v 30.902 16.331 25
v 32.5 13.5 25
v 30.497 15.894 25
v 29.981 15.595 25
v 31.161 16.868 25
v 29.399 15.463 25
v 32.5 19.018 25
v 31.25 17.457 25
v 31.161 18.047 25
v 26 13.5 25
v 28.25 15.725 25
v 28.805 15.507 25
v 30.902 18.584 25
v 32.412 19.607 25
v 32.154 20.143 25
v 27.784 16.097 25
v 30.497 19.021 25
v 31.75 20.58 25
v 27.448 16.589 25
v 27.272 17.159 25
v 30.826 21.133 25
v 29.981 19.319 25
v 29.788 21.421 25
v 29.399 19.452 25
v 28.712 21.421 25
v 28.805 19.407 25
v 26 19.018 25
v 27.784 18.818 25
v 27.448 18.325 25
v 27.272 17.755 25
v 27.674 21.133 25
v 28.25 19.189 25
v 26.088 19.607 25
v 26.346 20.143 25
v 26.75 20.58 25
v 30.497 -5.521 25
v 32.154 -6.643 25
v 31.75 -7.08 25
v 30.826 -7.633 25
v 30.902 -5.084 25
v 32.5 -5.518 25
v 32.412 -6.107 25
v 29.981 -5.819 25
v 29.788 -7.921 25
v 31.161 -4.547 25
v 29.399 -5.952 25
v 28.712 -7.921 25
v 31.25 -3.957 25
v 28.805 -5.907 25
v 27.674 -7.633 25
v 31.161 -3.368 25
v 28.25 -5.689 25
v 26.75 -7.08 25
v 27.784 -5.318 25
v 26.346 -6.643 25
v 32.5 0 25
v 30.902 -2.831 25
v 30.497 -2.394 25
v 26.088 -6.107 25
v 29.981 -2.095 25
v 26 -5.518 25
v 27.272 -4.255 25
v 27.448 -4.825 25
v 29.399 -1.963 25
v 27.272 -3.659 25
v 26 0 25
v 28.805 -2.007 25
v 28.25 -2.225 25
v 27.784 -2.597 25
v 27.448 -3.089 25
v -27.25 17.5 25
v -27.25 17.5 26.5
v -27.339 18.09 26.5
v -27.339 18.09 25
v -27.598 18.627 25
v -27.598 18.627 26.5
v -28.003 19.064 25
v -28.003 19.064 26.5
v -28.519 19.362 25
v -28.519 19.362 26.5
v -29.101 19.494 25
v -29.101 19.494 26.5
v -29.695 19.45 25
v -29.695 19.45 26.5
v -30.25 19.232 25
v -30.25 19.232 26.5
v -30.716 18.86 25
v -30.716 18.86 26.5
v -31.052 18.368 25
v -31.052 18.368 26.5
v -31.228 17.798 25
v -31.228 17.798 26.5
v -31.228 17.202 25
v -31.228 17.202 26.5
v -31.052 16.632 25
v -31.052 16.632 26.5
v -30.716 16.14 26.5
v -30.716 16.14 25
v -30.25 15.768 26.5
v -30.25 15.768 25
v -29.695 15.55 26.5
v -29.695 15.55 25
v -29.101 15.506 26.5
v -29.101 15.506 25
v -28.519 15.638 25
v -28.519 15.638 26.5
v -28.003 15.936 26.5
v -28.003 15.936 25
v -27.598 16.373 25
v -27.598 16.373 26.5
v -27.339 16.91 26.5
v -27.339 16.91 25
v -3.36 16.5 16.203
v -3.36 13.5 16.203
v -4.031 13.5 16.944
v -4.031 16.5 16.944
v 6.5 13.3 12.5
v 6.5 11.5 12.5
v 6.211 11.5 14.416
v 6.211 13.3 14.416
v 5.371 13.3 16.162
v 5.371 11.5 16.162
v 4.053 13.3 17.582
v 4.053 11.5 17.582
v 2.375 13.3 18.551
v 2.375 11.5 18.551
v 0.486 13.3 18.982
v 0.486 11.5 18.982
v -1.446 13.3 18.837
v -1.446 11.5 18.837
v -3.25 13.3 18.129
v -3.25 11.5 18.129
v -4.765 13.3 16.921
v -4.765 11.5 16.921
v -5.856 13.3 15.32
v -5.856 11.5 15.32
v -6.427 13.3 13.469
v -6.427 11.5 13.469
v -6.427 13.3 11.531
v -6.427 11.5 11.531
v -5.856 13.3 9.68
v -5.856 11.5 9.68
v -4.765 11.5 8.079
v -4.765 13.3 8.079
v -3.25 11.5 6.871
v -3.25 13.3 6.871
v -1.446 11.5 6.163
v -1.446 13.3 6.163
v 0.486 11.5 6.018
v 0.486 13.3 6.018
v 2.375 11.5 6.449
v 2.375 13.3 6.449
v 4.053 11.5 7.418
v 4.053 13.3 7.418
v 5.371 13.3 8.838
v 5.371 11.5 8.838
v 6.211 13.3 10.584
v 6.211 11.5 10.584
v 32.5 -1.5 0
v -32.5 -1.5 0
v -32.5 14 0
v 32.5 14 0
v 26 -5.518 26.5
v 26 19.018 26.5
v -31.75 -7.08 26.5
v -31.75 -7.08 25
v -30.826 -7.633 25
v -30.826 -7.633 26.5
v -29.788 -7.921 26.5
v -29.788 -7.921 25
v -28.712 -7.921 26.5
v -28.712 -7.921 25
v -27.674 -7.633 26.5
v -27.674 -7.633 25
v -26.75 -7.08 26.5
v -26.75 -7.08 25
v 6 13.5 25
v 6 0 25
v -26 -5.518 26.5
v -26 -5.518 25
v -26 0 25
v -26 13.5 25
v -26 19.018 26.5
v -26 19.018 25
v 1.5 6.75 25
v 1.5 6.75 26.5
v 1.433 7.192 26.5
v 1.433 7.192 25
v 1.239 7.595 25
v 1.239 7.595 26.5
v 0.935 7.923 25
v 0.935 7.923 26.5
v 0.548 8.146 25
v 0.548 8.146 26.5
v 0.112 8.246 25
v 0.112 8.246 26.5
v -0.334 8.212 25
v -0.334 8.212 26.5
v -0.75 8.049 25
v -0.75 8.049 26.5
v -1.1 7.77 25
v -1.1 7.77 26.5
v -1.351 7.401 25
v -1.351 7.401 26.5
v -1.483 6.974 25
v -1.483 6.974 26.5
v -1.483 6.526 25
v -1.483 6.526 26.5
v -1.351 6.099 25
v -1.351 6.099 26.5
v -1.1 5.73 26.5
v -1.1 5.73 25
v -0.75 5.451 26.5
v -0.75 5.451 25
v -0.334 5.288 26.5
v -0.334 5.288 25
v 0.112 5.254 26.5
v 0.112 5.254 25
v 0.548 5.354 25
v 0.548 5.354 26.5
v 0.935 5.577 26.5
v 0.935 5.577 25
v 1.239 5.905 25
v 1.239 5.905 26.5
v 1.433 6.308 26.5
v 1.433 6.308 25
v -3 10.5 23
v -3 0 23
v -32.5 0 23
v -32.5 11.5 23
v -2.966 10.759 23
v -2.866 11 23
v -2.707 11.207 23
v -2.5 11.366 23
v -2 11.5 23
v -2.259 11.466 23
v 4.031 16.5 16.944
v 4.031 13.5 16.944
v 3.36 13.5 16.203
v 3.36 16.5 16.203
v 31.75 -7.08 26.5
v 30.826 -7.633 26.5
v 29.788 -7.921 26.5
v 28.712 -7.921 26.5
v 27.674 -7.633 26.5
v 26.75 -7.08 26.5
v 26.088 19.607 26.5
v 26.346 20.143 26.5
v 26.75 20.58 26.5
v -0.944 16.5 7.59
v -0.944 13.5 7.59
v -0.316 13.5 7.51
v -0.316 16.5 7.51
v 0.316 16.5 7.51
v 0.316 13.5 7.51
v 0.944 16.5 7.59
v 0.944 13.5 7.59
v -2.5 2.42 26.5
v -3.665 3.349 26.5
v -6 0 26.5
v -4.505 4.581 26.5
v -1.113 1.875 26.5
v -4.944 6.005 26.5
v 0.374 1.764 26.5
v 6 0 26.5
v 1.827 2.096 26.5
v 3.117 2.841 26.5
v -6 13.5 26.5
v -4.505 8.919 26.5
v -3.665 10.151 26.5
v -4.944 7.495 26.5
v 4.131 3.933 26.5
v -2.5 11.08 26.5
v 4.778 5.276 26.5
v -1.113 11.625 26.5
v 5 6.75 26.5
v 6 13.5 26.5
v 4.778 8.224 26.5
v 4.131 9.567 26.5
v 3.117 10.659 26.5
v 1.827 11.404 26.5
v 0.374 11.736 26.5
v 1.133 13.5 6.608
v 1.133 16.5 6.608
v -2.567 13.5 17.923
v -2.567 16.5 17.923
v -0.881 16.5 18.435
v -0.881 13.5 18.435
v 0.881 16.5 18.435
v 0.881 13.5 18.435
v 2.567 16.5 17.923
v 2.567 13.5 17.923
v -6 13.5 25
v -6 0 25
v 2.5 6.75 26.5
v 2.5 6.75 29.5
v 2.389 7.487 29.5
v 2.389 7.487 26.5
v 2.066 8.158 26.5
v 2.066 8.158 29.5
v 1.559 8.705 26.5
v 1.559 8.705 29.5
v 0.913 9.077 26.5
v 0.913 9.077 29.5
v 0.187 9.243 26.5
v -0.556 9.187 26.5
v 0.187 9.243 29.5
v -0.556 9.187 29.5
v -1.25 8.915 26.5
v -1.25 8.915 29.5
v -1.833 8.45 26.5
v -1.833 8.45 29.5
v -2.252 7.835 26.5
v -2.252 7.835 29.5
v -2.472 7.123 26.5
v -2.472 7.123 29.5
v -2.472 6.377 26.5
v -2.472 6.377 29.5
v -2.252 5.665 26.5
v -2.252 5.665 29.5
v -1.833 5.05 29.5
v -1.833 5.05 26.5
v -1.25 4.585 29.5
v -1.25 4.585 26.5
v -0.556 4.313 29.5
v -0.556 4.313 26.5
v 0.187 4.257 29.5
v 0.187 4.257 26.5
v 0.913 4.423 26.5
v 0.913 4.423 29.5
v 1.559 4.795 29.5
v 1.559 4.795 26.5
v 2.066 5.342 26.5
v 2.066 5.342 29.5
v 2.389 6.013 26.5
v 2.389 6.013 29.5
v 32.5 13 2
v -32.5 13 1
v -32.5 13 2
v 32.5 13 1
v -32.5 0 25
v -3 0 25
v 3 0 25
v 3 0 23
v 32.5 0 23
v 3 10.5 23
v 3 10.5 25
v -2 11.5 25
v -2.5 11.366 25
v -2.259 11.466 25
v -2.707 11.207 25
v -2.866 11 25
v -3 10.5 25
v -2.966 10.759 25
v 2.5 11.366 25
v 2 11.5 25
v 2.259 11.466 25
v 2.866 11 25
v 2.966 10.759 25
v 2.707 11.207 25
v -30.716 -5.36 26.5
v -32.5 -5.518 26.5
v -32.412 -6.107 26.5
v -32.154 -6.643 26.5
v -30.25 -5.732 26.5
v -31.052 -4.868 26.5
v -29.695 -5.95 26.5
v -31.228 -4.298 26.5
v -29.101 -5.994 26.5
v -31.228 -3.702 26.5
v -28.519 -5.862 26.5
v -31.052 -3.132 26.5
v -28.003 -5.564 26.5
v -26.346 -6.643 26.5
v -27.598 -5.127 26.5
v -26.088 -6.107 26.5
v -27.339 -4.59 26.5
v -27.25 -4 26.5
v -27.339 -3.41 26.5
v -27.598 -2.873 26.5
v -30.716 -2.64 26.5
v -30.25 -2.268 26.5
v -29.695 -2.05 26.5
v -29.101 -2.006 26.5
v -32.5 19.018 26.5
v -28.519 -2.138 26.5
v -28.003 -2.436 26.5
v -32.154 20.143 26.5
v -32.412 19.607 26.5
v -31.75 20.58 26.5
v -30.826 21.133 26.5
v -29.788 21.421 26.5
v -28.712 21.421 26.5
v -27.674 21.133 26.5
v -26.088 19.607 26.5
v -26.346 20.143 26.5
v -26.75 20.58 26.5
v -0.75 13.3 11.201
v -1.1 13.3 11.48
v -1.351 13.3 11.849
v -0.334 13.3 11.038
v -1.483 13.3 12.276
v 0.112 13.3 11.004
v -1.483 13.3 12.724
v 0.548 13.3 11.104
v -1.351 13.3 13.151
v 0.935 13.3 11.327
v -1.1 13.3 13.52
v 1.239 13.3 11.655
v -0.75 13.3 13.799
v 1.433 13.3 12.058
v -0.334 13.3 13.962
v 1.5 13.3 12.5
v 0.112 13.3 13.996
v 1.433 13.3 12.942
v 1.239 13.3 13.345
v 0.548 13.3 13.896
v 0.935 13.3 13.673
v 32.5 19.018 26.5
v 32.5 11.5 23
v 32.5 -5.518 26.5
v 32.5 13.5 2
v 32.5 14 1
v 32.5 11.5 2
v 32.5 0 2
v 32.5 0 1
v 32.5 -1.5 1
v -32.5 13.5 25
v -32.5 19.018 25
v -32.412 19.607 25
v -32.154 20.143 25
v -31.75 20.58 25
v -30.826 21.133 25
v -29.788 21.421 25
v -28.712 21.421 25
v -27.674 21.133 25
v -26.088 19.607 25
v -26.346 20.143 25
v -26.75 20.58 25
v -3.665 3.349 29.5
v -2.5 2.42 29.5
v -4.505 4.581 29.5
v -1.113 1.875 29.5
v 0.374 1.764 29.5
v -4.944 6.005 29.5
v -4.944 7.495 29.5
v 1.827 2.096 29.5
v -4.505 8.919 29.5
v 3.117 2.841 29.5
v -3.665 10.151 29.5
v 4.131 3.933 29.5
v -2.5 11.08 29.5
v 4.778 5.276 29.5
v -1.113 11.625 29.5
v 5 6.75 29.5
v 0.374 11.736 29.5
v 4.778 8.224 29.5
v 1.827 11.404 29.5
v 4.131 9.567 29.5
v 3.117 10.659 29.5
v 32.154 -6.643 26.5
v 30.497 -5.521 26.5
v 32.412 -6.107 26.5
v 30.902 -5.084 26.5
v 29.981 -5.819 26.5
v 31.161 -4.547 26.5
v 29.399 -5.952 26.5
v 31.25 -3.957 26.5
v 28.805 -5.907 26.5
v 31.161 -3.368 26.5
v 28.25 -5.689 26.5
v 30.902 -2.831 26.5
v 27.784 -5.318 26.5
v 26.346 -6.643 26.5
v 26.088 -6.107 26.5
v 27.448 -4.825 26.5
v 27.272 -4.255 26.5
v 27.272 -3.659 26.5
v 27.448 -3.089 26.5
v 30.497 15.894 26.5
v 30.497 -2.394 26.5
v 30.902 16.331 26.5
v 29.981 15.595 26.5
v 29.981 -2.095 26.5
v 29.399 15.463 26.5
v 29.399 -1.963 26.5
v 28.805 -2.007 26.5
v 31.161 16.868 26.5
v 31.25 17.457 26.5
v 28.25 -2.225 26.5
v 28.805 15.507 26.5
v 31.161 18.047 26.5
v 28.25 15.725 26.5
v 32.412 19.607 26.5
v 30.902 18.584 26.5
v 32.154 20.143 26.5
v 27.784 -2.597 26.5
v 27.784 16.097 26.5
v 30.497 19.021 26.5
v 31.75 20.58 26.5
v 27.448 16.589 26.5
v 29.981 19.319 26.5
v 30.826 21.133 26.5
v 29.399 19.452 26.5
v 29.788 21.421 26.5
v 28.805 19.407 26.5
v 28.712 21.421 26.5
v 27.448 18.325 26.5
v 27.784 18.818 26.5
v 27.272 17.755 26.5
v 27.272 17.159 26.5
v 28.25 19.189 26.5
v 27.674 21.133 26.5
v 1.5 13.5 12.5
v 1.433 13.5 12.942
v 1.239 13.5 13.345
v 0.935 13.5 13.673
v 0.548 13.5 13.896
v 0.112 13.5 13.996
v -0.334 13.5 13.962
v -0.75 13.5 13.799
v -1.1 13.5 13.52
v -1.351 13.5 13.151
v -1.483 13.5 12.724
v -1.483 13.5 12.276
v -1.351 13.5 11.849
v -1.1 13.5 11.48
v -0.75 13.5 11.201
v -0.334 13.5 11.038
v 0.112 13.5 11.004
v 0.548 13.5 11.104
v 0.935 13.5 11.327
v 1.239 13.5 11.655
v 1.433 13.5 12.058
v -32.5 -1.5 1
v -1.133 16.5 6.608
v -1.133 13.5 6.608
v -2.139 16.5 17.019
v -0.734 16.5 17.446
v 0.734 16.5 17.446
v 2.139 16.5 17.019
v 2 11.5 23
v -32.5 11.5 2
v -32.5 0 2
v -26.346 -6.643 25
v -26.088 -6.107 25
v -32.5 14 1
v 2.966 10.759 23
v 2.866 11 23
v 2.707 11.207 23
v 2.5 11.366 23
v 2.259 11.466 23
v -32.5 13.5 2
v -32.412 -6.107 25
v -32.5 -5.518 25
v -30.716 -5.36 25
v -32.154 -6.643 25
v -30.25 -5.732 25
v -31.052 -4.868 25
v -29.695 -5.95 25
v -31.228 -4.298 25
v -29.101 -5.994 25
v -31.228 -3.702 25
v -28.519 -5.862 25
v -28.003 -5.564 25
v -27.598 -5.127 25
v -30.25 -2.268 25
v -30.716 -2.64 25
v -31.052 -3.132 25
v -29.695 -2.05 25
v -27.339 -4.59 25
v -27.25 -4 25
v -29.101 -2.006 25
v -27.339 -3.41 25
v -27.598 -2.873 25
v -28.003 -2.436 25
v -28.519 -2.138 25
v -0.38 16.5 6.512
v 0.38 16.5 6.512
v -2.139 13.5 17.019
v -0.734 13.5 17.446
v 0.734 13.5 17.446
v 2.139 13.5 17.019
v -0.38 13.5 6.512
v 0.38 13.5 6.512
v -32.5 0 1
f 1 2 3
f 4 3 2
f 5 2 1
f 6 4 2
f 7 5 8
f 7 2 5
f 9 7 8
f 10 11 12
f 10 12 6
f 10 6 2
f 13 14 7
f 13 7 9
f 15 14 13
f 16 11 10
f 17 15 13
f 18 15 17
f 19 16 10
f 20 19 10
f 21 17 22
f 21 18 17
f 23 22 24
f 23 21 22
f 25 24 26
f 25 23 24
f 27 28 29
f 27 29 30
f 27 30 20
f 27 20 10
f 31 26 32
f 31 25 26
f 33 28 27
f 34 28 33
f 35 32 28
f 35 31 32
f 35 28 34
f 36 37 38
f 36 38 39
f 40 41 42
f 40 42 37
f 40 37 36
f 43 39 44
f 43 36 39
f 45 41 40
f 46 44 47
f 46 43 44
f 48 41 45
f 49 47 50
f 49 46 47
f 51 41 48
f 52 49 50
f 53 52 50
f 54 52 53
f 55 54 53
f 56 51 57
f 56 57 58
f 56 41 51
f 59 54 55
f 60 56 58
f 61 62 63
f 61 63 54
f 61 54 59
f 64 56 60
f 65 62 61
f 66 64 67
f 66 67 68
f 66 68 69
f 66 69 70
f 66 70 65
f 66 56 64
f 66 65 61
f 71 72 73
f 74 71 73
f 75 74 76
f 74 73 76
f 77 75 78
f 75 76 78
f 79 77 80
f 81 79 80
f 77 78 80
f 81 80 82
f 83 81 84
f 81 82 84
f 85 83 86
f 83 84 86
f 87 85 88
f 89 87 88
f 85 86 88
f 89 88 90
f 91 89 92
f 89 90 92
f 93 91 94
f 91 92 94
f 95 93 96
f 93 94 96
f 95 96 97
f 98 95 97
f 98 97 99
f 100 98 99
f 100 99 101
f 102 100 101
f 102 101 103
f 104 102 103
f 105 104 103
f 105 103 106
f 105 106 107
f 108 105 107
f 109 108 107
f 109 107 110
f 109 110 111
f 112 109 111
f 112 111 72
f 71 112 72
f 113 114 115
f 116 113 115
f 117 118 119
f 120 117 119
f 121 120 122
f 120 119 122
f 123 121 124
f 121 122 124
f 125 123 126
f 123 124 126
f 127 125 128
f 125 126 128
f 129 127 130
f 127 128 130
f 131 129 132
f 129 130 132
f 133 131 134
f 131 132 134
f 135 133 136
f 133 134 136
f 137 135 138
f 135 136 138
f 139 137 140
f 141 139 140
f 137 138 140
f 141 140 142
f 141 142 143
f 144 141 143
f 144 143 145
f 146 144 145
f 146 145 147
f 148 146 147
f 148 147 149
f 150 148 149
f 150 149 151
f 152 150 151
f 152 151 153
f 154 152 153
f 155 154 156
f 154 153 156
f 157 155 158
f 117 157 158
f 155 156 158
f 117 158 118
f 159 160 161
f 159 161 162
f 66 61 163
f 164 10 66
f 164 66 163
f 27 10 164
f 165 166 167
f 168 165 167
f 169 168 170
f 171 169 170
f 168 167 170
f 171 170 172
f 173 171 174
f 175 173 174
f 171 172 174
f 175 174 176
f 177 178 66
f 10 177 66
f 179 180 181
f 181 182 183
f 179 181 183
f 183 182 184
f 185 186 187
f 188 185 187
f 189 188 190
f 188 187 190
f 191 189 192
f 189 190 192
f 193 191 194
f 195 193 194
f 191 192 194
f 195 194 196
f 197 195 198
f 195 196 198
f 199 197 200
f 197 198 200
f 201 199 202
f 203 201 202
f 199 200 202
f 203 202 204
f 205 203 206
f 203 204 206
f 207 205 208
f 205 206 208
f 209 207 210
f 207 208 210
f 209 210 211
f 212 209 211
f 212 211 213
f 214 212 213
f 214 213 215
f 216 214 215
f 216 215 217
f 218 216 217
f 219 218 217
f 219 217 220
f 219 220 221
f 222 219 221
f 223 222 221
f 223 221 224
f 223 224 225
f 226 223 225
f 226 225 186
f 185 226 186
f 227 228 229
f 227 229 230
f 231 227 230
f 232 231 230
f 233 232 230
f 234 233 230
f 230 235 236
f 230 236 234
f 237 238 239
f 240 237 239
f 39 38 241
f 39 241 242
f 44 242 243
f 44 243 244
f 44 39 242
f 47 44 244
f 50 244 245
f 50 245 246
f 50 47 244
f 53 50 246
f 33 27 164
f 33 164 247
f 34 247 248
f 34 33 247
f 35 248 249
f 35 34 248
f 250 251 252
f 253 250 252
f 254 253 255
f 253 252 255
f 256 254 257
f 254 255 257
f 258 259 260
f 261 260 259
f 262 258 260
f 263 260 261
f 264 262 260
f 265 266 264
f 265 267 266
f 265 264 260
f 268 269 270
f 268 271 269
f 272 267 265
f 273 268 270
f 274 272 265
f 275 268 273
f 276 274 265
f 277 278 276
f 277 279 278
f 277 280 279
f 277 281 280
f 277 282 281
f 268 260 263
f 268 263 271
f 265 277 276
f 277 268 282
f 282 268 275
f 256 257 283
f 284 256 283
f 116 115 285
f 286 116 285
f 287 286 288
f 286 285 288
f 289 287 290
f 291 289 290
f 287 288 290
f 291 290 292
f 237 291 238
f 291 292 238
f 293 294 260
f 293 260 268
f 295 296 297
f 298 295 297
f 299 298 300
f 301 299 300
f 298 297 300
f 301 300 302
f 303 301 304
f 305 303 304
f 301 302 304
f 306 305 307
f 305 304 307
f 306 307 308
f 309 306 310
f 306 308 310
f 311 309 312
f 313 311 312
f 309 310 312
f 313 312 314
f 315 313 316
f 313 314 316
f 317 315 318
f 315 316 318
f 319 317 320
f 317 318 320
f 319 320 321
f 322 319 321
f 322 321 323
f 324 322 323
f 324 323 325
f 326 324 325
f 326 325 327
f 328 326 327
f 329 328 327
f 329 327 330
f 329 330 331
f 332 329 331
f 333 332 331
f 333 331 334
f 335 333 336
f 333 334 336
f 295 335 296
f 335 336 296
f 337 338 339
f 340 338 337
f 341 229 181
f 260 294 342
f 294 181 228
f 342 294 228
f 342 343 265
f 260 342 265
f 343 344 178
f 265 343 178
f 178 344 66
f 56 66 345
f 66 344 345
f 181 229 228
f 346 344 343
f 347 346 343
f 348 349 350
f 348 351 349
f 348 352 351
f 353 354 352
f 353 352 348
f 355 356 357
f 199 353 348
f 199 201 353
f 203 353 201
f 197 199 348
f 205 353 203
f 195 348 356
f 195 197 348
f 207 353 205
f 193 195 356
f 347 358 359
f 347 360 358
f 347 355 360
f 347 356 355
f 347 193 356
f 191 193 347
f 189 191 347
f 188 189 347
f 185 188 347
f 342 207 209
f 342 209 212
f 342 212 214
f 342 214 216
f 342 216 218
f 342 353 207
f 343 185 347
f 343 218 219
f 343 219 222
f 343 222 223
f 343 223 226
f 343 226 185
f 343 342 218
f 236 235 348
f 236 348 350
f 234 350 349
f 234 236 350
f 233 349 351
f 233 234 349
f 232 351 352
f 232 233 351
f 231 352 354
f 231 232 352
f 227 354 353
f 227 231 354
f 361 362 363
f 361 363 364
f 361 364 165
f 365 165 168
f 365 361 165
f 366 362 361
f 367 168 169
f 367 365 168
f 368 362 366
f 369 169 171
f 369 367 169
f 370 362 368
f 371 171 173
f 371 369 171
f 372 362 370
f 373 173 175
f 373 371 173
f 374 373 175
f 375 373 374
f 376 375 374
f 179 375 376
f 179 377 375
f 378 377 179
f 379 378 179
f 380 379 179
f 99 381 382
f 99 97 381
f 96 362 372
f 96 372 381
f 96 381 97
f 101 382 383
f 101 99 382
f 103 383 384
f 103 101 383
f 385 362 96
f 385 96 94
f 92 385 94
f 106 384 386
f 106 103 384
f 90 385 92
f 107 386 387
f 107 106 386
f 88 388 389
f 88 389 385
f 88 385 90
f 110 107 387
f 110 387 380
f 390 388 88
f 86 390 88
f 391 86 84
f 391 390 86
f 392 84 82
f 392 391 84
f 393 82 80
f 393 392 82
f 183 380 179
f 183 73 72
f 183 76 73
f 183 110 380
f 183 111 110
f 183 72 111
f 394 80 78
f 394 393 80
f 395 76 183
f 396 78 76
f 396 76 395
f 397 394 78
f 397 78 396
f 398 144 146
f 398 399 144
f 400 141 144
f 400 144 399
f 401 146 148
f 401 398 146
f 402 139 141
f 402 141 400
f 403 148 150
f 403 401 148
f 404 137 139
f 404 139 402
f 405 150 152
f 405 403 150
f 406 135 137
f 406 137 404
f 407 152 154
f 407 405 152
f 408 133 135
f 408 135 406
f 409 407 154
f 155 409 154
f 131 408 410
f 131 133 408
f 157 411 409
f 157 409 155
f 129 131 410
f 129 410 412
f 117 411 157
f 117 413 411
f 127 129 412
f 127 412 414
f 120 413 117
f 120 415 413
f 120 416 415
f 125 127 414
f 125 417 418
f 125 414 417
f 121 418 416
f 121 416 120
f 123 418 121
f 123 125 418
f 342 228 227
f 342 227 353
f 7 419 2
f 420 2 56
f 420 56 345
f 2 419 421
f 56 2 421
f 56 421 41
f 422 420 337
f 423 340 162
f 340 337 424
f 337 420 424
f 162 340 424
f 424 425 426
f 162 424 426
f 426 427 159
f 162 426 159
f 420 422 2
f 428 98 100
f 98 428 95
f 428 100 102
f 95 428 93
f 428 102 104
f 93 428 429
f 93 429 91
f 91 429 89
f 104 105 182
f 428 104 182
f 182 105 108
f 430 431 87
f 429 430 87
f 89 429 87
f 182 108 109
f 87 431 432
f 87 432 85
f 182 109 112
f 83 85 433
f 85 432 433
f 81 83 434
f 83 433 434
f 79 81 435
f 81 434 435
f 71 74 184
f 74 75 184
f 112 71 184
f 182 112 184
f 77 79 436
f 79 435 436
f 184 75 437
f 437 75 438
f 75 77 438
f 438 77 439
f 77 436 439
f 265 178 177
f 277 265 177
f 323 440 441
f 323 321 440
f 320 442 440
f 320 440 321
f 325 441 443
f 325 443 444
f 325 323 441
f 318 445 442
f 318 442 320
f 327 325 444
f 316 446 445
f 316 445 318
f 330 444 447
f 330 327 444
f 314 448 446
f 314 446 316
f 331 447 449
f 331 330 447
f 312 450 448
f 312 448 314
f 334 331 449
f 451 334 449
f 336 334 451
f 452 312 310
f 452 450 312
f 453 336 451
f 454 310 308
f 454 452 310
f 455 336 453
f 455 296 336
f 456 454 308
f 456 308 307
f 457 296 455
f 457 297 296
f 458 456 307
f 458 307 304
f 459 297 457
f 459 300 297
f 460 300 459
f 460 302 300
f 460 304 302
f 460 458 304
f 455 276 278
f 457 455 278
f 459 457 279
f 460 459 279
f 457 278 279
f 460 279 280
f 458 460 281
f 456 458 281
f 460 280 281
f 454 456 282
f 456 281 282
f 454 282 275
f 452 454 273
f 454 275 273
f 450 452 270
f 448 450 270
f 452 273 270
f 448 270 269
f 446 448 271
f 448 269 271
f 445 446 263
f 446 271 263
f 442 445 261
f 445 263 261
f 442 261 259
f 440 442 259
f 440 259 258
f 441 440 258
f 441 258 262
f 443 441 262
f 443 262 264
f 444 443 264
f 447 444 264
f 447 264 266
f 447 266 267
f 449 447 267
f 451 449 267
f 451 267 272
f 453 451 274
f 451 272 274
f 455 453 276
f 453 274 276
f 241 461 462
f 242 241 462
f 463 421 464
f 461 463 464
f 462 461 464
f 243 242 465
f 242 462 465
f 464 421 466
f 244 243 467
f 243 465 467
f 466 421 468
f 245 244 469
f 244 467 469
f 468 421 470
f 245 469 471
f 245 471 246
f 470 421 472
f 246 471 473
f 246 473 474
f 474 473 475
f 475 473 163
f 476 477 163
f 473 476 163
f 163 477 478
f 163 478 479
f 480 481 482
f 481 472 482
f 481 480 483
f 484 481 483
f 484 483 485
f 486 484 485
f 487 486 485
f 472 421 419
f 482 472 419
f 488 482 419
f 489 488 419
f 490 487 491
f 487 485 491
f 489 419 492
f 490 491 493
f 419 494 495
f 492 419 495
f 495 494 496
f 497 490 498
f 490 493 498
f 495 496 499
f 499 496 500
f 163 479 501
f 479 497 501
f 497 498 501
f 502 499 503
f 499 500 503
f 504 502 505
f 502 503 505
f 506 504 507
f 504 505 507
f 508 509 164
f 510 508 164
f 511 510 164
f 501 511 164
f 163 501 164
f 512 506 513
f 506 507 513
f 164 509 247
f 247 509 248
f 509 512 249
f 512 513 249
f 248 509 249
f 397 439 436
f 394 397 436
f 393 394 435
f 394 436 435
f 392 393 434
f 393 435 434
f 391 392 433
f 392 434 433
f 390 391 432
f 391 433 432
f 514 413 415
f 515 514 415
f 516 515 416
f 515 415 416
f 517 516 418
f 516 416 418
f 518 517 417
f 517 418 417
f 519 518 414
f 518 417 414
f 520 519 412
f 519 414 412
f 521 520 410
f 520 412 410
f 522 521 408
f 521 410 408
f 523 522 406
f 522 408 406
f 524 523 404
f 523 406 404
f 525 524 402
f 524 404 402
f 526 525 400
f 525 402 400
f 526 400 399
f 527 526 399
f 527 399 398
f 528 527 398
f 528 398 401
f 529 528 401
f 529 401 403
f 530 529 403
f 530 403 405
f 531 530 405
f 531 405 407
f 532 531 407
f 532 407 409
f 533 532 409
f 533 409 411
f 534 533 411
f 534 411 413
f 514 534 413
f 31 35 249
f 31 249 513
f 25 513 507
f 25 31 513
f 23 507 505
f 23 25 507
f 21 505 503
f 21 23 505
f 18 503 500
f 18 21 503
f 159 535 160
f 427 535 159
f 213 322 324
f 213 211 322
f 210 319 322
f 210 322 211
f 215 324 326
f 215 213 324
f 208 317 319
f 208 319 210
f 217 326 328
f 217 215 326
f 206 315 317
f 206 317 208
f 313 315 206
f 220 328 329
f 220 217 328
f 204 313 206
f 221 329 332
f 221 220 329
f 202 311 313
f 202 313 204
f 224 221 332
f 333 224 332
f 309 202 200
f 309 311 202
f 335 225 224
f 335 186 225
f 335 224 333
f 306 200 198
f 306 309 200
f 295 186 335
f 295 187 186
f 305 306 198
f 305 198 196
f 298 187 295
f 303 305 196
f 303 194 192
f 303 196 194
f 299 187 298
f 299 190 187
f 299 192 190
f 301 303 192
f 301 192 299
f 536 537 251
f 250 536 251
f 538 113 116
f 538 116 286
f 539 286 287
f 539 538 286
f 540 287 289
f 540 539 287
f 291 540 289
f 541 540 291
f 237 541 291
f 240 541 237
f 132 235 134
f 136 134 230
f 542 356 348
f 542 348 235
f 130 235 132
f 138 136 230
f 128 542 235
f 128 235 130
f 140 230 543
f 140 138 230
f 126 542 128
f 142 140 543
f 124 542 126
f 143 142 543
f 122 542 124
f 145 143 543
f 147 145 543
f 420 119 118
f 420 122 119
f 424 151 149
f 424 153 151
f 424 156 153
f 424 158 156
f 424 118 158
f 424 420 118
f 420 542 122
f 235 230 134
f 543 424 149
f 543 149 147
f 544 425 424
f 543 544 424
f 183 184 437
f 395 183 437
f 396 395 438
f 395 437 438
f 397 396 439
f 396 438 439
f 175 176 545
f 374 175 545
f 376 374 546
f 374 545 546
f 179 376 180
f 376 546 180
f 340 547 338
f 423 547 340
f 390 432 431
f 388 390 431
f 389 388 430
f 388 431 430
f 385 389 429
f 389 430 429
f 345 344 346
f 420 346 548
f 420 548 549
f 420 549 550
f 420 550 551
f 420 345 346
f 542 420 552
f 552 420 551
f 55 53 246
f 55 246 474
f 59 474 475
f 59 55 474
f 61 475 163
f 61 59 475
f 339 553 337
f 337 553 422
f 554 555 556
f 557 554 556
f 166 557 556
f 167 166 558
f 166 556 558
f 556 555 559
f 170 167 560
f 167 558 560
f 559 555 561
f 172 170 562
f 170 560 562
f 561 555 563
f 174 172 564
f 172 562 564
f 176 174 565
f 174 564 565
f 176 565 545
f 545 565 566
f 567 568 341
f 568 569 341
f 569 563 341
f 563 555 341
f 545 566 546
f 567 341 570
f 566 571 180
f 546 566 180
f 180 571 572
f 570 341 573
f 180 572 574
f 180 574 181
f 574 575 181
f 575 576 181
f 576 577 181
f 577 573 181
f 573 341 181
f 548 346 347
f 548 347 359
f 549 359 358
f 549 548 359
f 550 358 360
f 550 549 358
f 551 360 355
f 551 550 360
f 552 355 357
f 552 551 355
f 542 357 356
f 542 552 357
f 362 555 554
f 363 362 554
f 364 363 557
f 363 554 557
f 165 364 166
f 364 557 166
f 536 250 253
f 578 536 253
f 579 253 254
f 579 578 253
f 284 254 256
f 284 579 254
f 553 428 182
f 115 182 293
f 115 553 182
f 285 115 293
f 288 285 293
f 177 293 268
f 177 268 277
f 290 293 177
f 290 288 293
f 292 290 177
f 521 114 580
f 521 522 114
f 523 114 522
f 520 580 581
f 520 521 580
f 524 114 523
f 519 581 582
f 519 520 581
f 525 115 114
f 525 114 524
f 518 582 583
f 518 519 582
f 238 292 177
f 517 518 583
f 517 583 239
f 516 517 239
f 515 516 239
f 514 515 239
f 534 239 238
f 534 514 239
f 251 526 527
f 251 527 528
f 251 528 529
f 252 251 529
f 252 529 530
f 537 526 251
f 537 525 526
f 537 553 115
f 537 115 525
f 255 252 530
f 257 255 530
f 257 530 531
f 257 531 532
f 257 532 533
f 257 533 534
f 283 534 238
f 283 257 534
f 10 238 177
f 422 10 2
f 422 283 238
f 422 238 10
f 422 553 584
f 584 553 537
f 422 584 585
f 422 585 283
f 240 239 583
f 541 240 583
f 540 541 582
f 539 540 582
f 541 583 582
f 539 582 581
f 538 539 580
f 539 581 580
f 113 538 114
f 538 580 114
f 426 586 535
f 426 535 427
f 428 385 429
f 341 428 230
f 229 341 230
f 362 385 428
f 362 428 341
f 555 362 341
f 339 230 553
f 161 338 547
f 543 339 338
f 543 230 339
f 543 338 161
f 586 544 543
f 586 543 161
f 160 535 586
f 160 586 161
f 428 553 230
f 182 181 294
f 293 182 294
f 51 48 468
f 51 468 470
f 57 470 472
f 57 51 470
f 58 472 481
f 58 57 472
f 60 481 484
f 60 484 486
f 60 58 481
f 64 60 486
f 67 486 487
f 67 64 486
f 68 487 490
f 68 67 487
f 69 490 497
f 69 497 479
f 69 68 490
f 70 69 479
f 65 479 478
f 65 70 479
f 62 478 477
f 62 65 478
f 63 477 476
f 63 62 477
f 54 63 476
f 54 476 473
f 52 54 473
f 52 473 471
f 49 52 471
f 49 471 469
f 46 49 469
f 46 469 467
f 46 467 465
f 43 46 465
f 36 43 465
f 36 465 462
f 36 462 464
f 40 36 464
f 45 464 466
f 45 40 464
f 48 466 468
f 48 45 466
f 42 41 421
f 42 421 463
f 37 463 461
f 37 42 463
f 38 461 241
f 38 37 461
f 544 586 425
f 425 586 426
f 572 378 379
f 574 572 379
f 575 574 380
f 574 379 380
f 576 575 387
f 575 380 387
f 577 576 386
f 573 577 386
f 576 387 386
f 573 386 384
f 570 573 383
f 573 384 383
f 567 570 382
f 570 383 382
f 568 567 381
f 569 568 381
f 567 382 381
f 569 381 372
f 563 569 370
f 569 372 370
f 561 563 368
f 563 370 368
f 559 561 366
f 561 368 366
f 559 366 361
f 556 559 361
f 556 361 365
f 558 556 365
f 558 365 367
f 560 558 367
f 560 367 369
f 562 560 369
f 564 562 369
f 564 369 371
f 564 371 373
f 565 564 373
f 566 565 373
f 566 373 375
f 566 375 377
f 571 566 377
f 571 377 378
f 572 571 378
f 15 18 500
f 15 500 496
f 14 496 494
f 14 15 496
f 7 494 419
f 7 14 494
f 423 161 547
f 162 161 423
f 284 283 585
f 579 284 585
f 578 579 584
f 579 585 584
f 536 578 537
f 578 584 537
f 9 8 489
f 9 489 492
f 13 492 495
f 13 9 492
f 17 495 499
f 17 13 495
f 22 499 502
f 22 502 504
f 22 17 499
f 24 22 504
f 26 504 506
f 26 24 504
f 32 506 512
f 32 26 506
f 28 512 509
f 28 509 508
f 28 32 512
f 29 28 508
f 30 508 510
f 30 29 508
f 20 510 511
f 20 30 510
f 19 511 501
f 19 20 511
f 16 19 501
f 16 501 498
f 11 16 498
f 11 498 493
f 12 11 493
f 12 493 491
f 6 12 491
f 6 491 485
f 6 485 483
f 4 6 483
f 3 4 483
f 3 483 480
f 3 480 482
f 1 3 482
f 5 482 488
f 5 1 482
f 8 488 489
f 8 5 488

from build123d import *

# Parameters (mm, degrees)
CROQUIS1_W               = 65
CROQUIS1_H               = 25
SALIENTE_EXTRUIR4_DEPTH  = 13.5
CROQUIS6_W               = 21
CROQUIS6_H               = 11.5
CORTAR_EXTRUIR2_DEPTH    = 65
CROQUIS5_R               = 2
SALIENTE_EXTRUIR6_DEPTH  = 1.5
CROQUIS7_W               = 12
CROQUIS7_H               = 13.5
SALIENTE_EXTRUIR7_DEPTH  = 1.5
CROQUIS8_R               = 5
SALIENTE_EXTRUIR8_DEPTH  = 3
CROQUIS9_R               = 2.5
CORTAR_EXTRUIR3_DEPTH    = 3
CROQUIS10_W              = 6
CROQUIS10_H              = 2
CORTAR_EXTRUIR4_DEPTH    = 10
CROQUIS11_R              = 1.5
CORTAR_EXTRUIR5_DEPTH    = 10
CROQUIS12_R              = 2
CORTAR_EXTRUIR6_DEPTH    = 10
CORTAR_EXTRUIR7_DEPTH    = 2
CROQUIS15_R              = 1.5
CORTAR_EXTRUIR8_DEPTH    = 2
CROQUIS18_R              = 6.5
CORTAR_EXTRUIR9_DEPTH    = 1.8
SALIENTE_EXTRUIR9_DEPTH  = 3
CROQUIS20_W              = 65
CROQUIS20_H              = 1
SALIENTE_EXTRUIR10_DEPTH = 1.5
CROQUIS21_W              = 65
CROQUIS21_H              = 1
SALIENTE_EXTRUIR11_DEPTH = 0.5
CROQUIS22_W              = 65
CROQUIS22_H              = 1
CORTAR_EXTRUIR10_DEPTH   = 0.5


with BuildPart() as part:
    # Croquis1 → Saliente-Extruir4 (new body)
    with BuildSketch(Plane(origin=(0, 0, 0), x_dir=(1, 0, 0), z_dir=(0, 1, 0))):
        with Locations((0, -12.5)):
            Rectangle(CROQUIS1_W, CROQUIS1_H)
    extrude(amount=SALIENTE_EXTRUIR4_DEPTH)

    # Croquis6 → Cortar-Extruir2 (cut)
    with BuildSketch(Plane(origin=(32.5, 0, 0), x_dir=(0, 0, -1), z_dir=(1, 0, 0))):
        with Locations((-12.5, 5.75)):
            Rectangle(CROQUIS6_W, CROQUIS6_H)
    extrude(amount=-CORTAR_EXTRUIR2_DEPTH, mode=Mode.SUBTRACT)

    # Croquis5 → Saliente-Extruir6 (add)
    with BuildSketch(Plane.XY.offset(25)):
        with BuildLine():
            Line((32.5, 0), (32.5, -5.518414164))
            ThreePointArc((32.5, -5.518414164), (32.302775638, -6.384439567), (31.75, -7.079663663))
            ThreePointArc((31.75, -7.079663663), (29.25, -7.957164664), (26.75, -7.079663663))
            ThreePointArc((26.75, -7.079663663), (26.197224362, -6.384439567), (26, -5.518414164))
            Line((26, -5.518414164), (26, 0))
            Line((26, 0), (26, 13.5))
            Line((26, 13.5), (26, 19.018414164))
            ThreePointArc((26, 19.018414164), (26.197224362, 19.884439567), (26.75, 20.579663663))
            ThreePointArc((26.75, 20.579663663), (29.25, 21.457164664), (31.75, 20.579663663))
            ThreePointArc((31.75, 20.579663663), (32.302775638, 19.884439567), (32.5, 19.018414164))
            Line((32.5, 19.018414164), (32.5, 13.5))
            Line((32.5, 13.5), (32.5, 0))
        make_face()
        with Locations((29.25, 17.457164664)):
            Circle(CROQUIS5_R, mode=Mode.SUBTRACT)
        with Locations((29.25, -3.957164664)):
            Circle(CROQUIS5_R, mode=Mode.SUBTRACT)
        with BuildLine():
            Line((-32.5, 0), (-32.5, -5.518414164))
            ThreePointArc((-32.5, -5.518414164), (-32.302775638, -6.384439567), (-31.75, -7.079663663))
            ThreePointArc((-31.75, -7.079663663), (-29.25, -7.957164664), (-26.75, -7.079663663))
            ThreePointArc((-26.75, -7.079663663), (-26.197224362, -6.384439567), (-26, -5.518414164))
            Line((-26, -5.518414164), (-26, 0))
            Line((-26, 0), (-26, 13.5))
            Line((-26, 13.5), (-26, 19.018414164))
            ThreePointArc((-26, 19.018414164), (-26.197224362, 19.884439567), (-26.75, 20.579663663))
            ThreePointArc((-26.75, 20.579663663), (-29.25, 21.457164664), (-31.75, 20.579663663))
            ThreePointArc((-31.75, 20.579663663), (-32.302775638, 19.884439567), (-32.5, 19.018414164))
            Line((-32.5, 19.018414164), (-32.5, 13.5))
            Line((-32.5, 13.5), (-32.5, 0))
        make_face()
    extrude(amount=SALIENTE_EXTRUIR6_DEPTH)

    # Croquis7 → Saliente-Extruir7 (add)
    with BuildSketch(Plane.XY.offset(25)):
        with Locations((0, 6.75)):
            Rectangle(CROQUIS7_W, CROQUIS7_H)
    extrude(amount=SALIENTE_EXTRUIR7_DEPTH)

    # Croquis8 → Saliente-Extruir8 (add)
    with BuildSketch(Plane.XY.offset(26.5)):
        with Locations((0, 6.75)):
            Circle(CROQUIS8_R)
    extrude(amount=SALIENTE_EXTRUIR8_DEPTH)

    # Croquis9 → Cortar-Extruir3 (cut)
    with BuildSketch(Plane.XY.offset(29.5)):
        with Locations((0, 6.75)):
            Circle(CROQUIS9_R)
    extrude(amount=-CORTAR_EXTRUIR3_DEPTH, mode=Mode.SUBTRACT)

    # Croquis10 → Cortar-Extruir4 (cut)
    with BuildSketch(Plane.XZ):
        with Locations((0, 24)):
            Rectangle(CROQUIS10_W, CROQUIS10_H)
    extrude(amount=-CORTAR_EXTRUIR4_DEPTH, mode=Mode.SUBTRACT)

    # Croquis11 → Cortar-Extruir5 (cut)
    with BuildSketch(Plane.XY.offset(26.5)):
        with Locations((0, 6.75)):
            Circle(CROQUIS11_R)
    extrude(amount=-CORTAR_EXTRUIR5_DEPTH, mode=Mode.SUBTRACT)

    # Croquis12 → Cortar-Extruir6 (cut)
    with BuildSketch(Plane.XY.offset(26.5)):
        with Locations((-29.25, 17.5)):
            Circle(CROQUIS12_R)
        with Locations((-29.25, -4)):
            Circle(CROQUIS12_R)
    extrude(amount=-CORTAR_EXTRUIR6_DEPTH, mode=Mode.SUBTRACT)

    # Croquis14 → Cortar-Extruir7 (cut)
    with BuildSketch(Plane(origin=(0, 0, 23), x_dir=(-1, 0, 0), z_dir=(0, 0, -1))):
        with BuildLine():
            Line((-3, 10), (-3, 10.5))
            ThreePointArc((-3, 10.5), (-2.707106781, 11.207106781), (-2, 11.5))
            Line((-2, 11.5), (2, 11.5))
            ThreePointArc((2, 11.5), (2.707106781, 11.207106781), (3, 10.5))
            Line((3, 10.5), (3, 10))
            Line((3, 10), (-3, 10))
        make_face()
    extrude(amount=-CORTAR_EXTRUIR7_DEPTH, mode=Mode.SUBTRACT)

    # Croquis15 → Cortar-Extruir8 (cut)
    with BuildSketch(Plane.XZ.offset(-11.5)):
        with Locations((0, 12.5)):
            Circle(CROQUIS15_R)
    extrude(amount=-CORTAR_EXTRUIR8_DEPTH, mode=Mode.SUBTRACT)

    # Croquis18 → Cortar-Extruir9 (cut)
    with BuildSketch(Plane.XZ.offset(-11.5)):
        with Locations((0, 12.5)):
            Circle(CROQUIS18_R)
    extrude(amount=-CORTAR_EXTRUIR9_DEPTH, mode=Mode.SUBTRACT)

    # Croquis19 → Saliente-Extruir9 (add)
    with BuildSketch(Plane(origin=(0, 13.5, 0), x_dir=(1, 0, 0), z_dir=(0, 1, 0))):
        with BuildLine():
            Line((-3.359531229, -16.203181054), (-4.031437475, -16.943817265))
            ThreePointArc((-4.031437475, -16.943817265), (0, -18.5), (4.031437475, -16.943817265))
            Line((4.031437475, -16.943817265), (3.359531229, -16.203181054))
            ThreePointArc((3.359531229, -16.203181054), (0, -17.5), (-3.359531229, -16.203181054))
        make_face()
        with BuildLine():
            Line((-1.132967397, -6.607938826), (-0.944139498, -7.589949022))
            ThreePointArc((-0.944139498, -7.589949022), (0, -7.5), (0.944139498, -7.589949022))
            Line((0.944139498, -7.589949022), (1.132967397, -6.607938826))
            ThreePointArc((1.132967397, -6.607938826), (0, -6.5), (-1.132967397, -6.607938826))
        make_face()
    extrude(amount=SALIENTE_EXTRUIR9_DEPTH)

    # Croquis20 → Saliente-Extruir10 (add)
    with BuildSketch(Plane.XZ):
        with Locations((0, 0.5)):
            Rectangle(CROQUIS20_W, CROQUIS20_H)
    extrude(amount=SALIENTE_EXTRUIR10_DEPTH)

    # Croquis21 → Saliente-Extruir11 (add)
    with BuildSketch(Plane(origin=(0, 13.5, 0), x_dir=(1, 0, 0), z_dir=(0, 1, 0))):
        with Locations((0, -0.5)):
            Rectangle(CROQUIS21_W, CROQUIS21_H)
    extrude(amount=SALIENTE_EXTRUIR11_DEPTH)

    # Croquis22 → Cortar-Extruir10 (cut)
    with BuildSketch(Plane(origin=(0, 13.5, 0), x_dir=(1, 0, 0), z_dir=(0, 1, 0))):
        with Locations((0, -1.5)):
            Rectangle(CROQUIS22_W, CROQUIS22_H)
    extrude(amount=-CORTAR_EXTRUIR10_DEPTH, mode=Mode.SUBTRACT)


solid = part.part
